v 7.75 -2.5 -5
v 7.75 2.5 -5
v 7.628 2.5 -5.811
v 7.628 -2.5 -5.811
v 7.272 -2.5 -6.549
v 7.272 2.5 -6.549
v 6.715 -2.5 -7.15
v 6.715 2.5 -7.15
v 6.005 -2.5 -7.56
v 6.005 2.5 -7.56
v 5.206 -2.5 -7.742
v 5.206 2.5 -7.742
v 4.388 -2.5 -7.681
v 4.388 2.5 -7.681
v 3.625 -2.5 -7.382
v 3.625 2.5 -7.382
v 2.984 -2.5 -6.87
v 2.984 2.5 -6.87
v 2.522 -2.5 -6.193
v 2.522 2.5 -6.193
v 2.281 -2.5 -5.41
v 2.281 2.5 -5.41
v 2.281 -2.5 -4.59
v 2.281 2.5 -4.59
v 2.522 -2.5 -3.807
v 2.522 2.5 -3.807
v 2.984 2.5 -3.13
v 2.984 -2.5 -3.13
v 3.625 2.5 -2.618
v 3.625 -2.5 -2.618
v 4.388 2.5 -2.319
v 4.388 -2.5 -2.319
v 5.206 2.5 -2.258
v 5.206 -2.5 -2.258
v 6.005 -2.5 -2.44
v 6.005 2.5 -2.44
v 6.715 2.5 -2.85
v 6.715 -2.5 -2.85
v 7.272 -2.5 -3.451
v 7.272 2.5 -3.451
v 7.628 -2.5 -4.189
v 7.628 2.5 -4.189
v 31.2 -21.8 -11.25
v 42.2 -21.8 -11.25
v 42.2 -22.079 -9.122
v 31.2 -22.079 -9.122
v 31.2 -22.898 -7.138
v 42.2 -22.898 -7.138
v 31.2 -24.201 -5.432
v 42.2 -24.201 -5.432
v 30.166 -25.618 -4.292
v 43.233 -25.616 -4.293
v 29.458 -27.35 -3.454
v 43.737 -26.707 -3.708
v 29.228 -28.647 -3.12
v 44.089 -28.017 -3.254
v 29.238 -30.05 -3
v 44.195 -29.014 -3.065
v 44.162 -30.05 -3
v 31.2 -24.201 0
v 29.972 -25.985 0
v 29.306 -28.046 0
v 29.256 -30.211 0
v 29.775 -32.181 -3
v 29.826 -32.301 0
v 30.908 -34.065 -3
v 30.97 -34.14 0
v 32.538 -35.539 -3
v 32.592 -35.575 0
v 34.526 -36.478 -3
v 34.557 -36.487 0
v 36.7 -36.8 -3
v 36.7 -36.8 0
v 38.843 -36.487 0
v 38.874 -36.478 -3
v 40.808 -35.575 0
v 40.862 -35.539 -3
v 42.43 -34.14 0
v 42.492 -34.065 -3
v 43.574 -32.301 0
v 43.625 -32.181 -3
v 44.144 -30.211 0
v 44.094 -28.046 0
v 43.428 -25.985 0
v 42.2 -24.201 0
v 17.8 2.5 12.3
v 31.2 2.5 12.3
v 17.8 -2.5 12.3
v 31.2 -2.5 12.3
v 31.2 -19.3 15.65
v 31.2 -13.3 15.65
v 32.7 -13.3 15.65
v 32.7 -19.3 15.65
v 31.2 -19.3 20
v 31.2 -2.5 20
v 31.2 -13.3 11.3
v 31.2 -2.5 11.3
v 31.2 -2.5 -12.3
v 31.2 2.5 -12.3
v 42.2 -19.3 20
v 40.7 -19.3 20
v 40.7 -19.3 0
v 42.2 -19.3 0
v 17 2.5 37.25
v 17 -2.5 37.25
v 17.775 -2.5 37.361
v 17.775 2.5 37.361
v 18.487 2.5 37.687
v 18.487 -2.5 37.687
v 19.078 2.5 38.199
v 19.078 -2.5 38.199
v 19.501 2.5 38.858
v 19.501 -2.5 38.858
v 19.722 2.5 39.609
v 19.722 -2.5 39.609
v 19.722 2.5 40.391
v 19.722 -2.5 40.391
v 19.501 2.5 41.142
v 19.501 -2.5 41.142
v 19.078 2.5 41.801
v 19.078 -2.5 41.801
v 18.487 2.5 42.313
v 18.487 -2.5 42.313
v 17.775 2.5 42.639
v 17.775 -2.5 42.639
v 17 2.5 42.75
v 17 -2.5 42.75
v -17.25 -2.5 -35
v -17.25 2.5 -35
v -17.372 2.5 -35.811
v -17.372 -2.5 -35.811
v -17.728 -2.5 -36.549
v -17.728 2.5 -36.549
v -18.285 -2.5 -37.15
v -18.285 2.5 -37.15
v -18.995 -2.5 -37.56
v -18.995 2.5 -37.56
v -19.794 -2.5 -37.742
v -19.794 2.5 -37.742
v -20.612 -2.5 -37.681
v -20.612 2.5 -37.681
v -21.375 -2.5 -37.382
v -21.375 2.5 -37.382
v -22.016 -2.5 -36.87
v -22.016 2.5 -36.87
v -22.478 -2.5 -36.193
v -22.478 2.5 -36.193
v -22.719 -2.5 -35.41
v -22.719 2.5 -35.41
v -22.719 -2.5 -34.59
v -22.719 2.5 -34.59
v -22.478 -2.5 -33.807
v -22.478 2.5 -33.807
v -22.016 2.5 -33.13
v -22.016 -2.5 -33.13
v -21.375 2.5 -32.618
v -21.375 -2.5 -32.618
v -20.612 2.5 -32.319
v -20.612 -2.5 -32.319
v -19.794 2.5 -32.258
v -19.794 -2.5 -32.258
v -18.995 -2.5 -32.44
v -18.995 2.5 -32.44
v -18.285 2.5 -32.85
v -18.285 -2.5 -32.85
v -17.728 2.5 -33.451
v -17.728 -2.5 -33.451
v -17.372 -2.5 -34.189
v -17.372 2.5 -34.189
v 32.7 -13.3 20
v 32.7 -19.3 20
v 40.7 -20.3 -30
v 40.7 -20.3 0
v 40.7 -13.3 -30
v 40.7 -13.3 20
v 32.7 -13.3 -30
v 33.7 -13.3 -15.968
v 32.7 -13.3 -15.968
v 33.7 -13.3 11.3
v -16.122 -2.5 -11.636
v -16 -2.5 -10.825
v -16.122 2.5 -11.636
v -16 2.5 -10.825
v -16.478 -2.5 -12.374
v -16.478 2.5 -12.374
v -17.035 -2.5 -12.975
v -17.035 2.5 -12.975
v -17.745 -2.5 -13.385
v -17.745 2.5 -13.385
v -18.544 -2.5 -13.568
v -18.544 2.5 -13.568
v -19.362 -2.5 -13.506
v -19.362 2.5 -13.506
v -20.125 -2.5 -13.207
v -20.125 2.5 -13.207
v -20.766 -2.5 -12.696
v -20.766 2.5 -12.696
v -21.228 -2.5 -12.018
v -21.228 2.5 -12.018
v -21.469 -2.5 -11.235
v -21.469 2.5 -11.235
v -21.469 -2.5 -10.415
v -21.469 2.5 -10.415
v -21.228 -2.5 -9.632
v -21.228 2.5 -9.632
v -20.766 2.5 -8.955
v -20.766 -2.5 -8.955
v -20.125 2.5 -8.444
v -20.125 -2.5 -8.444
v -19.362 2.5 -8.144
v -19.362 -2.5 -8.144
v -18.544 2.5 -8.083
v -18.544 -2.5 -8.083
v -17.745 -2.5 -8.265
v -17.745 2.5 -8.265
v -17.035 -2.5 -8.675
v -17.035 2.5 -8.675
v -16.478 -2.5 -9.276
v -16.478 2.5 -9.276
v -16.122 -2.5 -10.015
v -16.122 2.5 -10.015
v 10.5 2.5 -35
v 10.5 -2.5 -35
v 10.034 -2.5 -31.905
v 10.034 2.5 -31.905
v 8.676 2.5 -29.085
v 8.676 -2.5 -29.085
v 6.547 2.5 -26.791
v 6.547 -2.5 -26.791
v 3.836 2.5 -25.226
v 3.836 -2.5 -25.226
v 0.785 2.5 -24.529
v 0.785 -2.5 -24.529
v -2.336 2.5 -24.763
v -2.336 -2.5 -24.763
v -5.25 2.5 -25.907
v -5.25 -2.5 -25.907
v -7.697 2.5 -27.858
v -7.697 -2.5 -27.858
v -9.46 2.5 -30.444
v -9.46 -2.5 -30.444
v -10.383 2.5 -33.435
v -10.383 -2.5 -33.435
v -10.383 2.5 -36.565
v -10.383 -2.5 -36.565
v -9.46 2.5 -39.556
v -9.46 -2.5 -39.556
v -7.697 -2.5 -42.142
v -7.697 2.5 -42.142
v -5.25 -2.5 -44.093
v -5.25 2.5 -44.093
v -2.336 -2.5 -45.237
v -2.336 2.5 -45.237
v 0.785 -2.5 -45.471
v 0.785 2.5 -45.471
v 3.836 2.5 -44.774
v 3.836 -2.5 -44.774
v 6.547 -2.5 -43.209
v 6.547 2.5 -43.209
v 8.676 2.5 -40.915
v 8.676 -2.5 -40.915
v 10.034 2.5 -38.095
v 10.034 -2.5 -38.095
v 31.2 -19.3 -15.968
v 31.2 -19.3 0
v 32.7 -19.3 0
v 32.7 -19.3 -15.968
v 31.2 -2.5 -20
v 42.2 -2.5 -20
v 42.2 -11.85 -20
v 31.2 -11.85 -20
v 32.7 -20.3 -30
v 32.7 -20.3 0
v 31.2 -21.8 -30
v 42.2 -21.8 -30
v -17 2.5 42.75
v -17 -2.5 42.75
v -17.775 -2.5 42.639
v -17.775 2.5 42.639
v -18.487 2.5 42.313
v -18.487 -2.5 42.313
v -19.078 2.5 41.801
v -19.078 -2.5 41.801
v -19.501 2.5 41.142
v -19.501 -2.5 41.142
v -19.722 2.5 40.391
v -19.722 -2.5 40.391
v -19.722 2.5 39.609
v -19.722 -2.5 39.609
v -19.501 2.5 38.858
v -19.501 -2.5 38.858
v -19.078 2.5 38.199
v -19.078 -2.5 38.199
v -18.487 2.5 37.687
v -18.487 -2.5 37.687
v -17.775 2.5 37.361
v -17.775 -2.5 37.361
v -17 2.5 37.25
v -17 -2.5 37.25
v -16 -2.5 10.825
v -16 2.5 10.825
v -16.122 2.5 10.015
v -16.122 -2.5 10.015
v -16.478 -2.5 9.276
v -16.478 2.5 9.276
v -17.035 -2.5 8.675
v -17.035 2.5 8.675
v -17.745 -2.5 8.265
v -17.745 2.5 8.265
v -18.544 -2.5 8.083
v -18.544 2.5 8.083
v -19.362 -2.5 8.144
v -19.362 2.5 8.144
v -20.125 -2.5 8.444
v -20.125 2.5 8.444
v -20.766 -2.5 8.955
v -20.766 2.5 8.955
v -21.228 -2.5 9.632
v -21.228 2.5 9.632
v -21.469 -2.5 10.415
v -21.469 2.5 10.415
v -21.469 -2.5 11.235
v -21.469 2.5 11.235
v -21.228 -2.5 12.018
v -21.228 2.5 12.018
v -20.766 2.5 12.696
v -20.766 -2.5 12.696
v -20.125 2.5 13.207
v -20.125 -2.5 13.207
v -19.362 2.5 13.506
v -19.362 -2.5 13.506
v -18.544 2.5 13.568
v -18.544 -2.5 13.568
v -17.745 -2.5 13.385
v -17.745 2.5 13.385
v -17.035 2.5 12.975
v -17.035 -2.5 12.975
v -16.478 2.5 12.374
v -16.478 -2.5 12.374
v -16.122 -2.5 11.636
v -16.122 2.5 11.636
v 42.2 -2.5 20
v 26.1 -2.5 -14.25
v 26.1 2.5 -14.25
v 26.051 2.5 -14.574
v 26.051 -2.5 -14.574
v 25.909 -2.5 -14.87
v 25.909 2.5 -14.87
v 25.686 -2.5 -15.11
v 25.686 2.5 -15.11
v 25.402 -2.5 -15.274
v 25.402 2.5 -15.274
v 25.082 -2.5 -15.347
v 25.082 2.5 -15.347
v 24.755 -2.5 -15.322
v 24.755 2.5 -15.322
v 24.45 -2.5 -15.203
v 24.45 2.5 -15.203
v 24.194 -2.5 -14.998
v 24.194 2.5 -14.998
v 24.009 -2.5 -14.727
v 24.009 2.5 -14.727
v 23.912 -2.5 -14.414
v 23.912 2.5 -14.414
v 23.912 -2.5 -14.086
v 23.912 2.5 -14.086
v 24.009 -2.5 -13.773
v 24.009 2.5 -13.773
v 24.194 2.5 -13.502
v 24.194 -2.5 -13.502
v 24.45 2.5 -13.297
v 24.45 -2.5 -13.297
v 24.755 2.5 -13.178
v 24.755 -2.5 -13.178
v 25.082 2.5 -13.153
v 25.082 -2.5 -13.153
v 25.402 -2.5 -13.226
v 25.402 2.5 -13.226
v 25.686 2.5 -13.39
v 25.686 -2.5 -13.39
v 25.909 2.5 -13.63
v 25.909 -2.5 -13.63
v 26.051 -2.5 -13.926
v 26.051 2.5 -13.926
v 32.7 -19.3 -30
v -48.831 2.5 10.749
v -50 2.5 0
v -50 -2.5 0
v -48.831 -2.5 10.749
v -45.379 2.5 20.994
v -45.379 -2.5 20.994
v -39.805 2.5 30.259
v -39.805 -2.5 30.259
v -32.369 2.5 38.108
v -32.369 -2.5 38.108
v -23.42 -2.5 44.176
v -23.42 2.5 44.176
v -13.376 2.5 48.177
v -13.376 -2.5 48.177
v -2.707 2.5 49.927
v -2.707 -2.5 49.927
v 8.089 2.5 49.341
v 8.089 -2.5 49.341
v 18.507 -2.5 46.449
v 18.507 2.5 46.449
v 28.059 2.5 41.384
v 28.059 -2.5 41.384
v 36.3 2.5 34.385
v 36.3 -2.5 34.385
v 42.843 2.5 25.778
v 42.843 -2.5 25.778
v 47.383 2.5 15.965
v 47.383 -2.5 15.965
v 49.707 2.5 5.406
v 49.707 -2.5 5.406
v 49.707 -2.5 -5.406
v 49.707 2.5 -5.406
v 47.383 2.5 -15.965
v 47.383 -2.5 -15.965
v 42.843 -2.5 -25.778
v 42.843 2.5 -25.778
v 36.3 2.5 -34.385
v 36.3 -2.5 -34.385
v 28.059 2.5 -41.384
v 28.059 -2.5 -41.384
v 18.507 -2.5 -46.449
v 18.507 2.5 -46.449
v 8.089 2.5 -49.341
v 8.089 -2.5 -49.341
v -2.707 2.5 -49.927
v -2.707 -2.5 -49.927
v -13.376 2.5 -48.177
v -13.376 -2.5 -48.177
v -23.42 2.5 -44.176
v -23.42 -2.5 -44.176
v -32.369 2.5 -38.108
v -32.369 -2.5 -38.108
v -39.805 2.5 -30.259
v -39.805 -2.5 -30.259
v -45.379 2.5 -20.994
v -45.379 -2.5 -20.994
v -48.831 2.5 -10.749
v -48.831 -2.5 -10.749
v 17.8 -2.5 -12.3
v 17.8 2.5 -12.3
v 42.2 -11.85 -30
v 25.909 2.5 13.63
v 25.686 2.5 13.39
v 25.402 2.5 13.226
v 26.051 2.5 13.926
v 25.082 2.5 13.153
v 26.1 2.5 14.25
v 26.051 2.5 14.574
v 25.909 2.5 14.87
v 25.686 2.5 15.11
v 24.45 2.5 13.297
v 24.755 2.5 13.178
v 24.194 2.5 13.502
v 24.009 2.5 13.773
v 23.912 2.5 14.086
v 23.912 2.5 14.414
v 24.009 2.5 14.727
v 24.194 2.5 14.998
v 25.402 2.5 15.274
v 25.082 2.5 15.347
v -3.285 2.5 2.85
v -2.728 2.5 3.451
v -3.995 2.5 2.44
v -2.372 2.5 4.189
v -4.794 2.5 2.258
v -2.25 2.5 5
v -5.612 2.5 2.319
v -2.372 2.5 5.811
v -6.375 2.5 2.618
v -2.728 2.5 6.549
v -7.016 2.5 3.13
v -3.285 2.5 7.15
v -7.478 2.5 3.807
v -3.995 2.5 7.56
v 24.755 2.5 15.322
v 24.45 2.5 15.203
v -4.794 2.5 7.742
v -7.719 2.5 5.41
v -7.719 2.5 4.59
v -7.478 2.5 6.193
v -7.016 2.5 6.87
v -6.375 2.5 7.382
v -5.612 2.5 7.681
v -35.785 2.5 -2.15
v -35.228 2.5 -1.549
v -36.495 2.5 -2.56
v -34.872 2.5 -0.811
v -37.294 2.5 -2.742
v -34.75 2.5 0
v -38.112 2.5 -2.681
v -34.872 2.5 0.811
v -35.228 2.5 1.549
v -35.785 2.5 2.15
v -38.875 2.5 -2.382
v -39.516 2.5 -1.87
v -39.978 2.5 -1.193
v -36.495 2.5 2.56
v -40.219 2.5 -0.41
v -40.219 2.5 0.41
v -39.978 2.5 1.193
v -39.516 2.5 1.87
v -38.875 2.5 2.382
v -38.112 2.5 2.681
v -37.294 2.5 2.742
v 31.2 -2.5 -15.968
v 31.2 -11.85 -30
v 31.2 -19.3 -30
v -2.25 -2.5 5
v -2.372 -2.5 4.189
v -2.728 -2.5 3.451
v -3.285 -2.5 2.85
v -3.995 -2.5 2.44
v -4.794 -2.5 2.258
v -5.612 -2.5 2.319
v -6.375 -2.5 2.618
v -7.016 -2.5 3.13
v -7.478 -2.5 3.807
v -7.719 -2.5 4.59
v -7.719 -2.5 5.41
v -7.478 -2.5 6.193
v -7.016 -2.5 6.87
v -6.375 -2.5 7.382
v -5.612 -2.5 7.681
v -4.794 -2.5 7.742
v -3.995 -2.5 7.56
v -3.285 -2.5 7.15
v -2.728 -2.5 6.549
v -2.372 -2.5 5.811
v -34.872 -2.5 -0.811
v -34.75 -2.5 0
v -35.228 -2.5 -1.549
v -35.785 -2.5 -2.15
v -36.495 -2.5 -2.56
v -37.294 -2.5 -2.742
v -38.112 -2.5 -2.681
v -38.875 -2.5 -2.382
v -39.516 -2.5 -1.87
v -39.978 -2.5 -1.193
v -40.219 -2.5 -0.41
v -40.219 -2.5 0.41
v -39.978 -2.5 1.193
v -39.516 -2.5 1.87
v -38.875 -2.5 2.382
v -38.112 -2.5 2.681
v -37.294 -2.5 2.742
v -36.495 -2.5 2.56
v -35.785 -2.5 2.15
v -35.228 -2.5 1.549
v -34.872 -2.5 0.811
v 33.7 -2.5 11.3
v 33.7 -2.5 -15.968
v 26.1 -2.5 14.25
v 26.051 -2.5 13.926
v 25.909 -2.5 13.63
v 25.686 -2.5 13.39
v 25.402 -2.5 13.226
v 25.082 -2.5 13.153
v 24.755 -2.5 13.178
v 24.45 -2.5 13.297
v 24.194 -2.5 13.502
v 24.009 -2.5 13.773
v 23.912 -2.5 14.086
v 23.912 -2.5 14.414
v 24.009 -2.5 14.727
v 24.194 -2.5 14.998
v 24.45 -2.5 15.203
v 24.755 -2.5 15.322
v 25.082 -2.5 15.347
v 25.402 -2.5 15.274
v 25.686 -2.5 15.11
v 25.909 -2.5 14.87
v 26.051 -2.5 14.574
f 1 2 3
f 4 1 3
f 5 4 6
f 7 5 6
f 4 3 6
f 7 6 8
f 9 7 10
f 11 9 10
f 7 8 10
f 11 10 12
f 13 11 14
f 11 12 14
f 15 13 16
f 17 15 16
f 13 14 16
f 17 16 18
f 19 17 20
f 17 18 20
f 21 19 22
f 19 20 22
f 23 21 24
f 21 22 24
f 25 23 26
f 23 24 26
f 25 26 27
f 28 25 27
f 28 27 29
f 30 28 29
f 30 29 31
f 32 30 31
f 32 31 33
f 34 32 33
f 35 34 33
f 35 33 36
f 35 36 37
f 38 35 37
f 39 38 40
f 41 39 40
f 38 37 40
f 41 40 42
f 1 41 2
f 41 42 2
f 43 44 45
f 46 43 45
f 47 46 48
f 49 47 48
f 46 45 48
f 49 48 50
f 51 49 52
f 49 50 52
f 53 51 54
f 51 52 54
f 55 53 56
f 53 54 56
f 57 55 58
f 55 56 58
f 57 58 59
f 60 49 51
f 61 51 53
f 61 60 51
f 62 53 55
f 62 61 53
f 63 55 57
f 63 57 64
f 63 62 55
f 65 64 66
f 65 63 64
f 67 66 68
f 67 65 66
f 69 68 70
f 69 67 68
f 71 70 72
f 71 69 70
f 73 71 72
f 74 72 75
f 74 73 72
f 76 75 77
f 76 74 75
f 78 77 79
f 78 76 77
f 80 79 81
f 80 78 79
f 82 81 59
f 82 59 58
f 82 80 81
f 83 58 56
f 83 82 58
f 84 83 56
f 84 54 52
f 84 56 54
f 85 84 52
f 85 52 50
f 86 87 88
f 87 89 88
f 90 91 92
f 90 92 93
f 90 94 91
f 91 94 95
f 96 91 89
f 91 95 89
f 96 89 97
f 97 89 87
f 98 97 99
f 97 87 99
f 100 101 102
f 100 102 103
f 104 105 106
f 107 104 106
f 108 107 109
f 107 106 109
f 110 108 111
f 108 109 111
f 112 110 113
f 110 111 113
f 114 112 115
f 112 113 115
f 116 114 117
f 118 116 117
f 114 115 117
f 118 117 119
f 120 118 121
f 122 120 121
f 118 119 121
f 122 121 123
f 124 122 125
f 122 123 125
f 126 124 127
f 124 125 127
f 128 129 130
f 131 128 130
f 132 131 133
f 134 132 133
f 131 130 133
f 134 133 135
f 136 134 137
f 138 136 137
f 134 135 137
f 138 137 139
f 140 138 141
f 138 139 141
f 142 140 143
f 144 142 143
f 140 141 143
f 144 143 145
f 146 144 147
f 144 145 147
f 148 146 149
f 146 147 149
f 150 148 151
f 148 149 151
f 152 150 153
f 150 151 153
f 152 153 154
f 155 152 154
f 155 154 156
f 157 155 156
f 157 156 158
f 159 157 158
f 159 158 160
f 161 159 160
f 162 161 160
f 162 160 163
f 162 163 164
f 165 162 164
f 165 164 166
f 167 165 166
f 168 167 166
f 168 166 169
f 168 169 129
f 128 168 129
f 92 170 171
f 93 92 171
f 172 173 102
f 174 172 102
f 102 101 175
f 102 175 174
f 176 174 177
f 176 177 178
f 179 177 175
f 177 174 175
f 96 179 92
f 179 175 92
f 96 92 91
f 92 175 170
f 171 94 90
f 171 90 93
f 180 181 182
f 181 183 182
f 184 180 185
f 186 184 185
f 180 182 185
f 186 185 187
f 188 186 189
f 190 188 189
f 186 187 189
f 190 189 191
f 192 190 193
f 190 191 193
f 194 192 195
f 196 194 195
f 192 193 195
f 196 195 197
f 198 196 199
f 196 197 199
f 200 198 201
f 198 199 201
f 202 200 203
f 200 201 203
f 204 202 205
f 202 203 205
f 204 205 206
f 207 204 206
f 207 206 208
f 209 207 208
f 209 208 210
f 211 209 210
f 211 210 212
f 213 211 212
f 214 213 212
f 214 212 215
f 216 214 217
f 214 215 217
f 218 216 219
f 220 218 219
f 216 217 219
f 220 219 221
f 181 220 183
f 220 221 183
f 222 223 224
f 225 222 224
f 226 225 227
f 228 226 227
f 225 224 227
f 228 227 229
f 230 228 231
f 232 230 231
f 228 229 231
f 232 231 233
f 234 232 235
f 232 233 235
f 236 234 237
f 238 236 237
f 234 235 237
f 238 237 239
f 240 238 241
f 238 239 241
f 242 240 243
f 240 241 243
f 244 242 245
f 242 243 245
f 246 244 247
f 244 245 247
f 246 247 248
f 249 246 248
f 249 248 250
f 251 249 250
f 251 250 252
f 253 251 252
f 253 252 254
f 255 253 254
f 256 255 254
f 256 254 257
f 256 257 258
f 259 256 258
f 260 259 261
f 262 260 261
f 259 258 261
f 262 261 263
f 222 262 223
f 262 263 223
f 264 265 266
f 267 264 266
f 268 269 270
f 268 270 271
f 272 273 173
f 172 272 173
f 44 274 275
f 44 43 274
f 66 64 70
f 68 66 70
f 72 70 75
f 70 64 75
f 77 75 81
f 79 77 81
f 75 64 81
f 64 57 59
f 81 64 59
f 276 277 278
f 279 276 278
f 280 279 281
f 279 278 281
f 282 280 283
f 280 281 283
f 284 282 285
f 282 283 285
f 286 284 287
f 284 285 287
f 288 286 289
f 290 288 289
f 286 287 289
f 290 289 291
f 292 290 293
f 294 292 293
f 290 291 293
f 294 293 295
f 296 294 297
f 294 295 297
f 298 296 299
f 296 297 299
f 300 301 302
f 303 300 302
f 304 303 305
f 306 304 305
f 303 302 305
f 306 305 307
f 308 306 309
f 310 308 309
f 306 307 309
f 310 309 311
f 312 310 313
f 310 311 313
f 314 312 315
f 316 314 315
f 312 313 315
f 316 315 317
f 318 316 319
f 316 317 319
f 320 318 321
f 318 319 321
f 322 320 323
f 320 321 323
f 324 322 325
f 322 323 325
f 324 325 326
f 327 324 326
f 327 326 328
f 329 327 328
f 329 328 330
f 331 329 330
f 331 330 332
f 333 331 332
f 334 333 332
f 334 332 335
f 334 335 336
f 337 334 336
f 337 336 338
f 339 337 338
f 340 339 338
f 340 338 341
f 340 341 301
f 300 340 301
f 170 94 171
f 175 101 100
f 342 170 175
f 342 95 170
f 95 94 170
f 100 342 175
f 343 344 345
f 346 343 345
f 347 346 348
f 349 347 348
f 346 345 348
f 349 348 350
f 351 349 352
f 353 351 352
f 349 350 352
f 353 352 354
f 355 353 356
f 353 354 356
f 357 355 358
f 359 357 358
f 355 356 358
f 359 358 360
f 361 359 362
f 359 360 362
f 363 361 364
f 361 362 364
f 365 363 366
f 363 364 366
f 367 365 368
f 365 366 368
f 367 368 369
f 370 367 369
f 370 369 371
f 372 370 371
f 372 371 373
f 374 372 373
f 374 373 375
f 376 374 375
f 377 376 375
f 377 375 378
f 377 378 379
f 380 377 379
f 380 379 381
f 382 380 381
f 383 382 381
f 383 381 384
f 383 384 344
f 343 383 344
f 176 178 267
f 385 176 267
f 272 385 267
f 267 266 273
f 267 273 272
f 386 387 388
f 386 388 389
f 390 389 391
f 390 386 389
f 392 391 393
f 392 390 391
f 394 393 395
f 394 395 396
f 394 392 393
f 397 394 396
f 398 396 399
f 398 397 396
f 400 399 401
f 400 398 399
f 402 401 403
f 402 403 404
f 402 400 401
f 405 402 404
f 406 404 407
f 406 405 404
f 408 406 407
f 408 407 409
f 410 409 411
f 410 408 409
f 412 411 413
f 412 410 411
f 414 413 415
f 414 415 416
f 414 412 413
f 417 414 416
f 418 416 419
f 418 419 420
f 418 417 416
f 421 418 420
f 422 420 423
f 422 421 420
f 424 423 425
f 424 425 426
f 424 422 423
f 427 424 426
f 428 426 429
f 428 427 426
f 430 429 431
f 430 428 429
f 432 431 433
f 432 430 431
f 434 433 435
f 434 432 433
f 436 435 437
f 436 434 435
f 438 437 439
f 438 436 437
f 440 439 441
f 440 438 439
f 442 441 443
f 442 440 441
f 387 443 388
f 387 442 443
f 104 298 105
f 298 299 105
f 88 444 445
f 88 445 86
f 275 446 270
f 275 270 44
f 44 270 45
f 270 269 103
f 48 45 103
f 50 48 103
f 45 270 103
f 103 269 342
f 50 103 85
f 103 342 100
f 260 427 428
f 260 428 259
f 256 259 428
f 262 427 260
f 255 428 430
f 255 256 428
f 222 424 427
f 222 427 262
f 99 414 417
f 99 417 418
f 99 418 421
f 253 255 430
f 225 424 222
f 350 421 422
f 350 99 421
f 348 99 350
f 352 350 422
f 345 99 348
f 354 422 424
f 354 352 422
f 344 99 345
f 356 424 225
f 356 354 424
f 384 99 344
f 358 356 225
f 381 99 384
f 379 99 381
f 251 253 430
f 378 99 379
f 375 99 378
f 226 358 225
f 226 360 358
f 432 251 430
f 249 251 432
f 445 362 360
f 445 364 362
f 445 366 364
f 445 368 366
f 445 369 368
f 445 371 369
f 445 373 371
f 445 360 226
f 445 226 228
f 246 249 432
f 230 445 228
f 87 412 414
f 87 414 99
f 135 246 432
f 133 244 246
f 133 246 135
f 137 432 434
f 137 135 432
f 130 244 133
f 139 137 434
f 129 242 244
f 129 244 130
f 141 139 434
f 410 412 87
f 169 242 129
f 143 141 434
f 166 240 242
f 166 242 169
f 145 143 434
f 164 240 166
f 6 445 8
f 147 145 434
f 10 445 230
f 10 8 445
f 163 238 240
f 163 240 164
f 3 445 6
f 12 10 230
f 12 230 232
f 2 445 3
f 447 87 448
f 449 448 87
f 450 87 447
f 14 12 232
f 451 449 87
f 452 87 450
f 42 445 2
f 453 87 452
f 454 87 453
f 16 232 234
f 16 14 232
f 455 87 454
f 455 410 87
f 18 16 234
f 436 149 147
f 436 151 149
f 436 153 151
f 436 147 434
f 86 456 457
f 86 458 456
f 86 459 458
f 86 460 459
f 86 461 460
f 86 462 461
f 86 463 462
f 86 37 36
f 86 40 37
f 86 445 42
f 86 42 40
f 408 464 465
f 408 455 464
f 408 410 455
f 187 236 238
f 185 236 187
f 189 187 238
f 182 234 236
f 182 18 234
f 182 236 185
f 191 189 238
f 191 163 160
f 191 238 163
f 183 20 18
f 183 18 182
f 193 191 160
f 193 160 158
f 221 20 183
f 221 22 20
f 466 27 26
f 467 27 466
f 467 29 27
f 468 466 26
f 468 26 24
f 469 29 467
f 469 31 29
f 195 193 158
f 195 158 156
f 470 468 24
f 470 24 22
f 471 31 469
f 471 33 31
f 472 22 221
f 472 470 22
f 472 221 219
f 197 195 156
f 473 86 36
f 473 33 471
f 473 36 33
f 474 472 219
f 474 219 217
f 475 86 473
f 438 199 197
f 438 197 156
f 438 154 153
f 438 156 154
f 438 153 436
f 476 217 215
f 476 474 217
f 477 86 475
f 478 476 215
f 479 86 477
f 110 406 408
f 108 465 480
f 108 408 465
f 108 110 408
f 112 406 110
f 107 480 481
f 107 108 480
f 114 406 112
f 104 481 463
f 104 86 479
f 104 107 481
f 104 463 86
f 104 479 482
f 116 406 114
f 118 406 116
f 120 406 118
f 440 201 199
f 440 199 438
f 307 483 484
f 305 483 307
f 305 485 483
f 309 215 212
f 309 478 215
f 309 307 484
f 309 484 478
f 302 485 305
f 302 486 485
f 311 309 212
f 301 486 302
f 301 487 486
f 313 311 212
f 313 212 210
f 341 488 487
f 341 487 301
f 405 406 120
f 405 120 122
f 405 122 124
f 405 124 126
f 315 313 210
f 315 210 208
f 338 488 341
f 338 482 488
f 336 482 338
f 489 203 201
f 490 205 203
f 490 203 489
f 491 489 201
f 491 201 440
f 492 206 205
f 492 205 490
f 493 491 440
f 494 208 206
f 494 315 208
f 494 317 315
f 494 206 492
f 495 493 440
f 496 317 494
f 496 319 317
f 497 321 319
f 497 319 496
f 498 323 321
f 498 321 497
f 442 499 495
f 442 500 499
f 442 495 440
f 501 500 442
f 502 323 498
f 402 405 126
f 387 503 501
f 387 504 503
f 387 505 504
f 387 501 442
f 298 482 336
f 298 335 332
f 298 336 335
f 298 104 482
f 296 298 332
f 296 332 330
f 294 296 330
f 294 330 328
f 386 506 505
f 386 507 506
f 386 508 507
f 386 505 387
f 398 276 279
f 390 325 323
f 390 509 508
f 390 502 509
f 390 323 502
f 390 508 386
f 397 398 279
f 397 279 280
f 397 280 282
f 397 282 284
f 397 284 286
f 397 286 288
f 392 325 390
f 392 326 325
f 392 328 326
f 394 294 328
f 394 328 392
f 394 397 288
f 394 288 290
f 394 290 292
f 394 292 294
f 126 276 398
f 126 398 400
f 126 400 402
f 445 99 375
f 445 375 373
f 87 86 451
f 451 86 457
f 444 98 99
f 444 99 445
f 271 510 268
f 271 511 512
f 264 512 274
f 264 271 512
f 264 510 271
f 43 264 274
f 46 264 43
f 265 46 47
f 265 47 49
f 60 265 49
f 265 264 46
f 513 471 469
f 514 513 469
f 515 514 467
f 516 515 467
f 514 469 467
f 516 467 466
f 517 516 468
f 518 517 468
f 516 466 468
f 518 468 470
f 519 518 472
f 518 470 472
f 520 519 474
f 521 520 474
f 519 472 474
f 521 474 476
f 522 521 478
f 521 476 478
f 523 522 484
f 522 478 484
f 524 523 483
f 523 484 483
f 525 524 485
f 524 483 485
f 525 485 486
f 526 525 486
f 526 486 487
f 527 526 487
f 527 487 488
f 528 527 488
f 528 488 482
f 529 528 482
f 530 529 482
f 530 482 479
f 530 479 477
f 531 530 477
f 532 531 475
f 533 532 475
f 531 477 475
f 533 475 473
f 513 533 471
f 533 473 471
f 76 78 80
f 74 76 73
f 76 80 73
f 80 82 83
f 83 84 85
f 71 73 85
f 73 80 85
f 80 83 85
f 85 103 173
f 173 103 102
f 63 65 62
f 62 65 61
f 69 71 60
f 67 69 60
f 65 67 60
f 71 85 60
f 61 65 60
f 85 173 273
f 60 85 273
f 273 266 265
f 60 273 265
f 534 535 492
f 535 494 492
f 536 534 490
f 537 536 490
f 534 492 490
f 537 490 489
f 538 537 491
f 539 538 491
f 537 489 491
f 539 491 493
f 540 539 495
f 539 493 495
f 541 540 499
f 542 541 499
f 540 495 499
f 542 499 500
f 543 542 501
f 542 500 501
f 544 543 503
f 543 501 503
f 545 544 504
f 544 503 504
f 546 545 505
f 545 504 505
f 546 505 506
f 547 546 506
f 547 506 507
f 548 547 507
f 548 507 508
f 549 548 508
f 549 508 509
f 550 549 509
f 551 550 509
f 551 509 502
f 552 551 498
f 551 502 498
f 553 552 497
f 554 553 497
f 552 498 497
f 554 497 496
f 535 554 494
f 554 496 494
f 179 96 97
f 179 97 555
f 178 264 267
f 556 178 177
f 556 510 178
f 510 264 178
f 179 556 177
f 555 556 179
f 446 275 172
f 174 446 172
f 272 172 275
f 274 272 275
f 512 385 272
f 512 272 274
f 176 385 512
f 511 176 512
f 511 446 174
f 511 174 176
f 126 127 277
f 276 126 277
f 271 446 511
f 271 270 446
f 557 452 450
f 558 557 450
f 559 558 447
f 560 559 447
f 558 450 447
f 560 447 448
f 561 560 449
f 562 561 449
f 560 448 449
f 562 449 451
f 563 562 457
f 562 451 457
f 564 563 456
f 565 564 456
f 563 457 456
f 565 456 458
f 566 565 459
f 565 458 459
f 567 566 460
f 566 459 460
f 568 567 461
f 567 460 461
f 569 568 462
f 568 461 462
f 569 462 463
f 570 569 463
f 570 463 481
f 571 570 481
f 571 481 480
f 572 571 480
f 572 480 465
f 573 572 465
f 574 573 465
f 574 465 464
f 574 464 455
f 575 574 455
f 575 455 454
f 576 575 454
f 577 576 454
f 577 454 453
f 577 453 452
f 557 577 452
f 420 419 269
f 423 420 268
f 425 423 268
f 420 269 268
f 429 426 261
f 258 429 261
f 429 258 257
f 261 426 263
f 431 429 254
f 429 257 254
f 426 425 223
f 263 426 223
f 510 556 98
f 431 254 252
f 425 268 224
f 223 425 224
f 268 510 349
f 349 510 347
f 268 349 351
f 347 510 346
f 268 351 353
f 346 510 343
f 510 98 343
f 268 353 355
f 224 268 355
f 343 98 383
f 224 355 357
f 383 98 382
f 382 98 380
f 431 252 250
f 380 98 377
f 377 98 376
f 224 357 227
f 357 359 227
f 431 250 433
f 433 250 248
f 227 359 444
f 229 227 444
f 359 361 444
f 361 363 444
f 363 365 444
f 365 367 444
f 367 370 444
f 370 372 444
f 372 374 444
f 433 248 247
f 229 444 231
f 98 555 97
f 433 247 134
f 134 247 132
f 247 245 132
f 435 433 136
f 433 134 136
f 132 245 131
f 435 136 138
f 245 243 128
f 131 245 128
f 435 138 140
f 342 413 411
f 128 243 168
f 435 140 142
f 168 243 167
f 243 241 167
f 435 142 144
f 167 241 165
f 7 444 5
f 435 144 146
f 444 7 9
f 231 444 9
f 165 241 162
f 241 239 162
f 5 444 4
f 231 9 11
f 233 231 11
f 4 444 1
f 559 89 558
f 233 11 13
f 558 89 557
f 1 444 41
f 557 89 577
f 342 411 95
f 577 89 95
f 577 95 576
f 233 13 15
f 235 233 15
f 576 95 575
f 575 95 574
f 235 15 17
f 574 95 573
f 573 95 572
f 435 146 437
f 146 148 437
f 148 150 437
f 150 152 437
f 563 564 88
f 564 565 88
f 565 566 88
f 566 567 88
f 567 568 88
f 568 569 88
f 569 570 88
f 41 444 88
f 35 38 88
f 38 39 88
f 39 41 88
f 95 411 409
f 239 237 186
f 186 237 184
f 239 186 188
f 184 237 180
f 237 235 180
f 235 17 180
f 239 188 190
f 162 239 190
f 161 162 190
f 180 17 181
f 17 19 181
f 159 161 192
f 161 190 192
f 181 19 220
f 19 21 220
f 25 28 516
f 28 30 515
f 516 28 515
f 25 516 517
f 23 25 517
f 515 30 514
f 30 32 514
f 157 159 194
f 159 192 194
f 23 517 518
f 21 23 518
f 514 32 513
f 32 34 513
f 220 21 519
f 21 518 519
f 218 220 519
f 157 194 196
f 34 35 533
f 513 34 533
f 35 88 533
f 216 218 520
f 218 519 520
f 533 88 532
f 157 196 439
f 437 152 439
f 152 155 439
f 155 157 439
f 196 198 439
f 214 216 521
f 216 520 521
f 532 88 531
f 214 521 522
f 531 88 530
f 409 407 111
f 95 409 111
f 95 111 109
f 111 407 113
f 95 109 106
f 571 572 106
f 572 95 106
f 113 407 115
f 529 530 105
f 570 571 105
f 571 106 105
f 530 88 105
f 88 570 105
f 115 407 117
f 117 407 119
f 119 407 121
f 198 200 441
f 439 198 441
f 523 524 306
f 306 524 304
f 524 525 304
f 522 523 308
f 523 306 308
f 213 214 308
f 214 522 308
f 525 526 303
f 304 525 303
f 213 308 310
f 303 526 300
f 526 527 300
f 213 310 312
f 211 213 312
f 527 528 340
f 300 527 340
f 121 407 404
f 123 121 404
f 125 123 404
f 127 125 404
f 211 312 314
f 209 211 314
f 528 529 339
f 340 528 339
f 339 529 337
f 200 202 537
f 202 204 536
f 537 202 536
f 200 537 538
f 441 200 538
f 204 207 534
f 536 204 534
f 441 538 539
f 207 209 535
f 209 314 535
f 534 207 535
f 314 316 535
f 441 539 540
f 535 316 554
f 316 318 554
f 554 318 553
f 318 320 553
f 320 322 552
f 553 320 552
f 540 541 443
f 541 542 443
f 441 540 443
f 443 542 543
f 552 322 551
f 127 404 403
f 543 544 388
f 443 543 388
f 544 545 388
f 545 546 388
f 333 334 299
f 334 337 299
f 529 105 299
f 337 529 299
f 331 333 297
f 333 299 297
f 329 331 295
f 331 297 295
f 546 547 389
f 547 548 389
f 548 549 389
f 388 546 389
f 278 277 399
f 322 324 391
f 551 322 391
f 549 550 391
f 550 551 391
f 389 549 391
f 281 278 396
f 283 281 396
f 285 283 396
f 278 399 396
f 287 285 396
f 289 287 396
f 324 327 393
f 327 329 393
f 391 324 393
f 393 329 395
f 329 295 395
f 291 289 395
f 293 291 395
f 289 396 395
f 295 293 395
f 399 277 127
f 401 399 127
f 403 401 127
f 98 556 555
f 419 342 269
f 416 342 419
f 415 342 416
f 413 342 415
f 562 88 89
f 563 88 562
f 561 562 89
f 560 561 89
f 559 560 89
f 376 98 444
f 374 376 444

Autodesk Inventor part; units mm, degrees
ref_plane "YZ Plane" through (0, 0, 0) normal (1, 0, 0) x (0, 1, 0)
ref_plane "XZ Plane" through (0, 0, 0) normal (0, 1, 0) x (-1, 0, 0)
ref_plane "XY Plane" through (0, 0, 0) normal (0, 0, 1) x (1, 0, 0)
sketch "Sketch1" plane through (0, 0, 0) normal (0, 1, 0) x (-1, 0, 0)
  circle A0 centre (0, 0) radius 50
  dimension "d0" = 100
extrude "Extrusion1" add sketch "Sketch1" along normal mid plane 5
sketch "Sketch2" plane through (0, 2.5, 0) normal (0, 1, 0) x (1, 0, 0)
  line L0 (-5, 5) -> (5, 5) construction
  line L1 (5, 5) -> (5, -5) construction
  line L2 (5, -5) -> (-5, -5) construction
  line L3 (-5, -5) -> (-5, 5) construction
  line L4 (-5, 5) -> (5, -5) construction
  line L5 (5, 5) -> (-5, -5) construction
  circle A0 centre (5, 5) radius 2.75
  circle A1 centre (-5, -5) radius 2.75
  point P0 (0, 0)
  dimension "d77" = 10
  dimension "d78" = 10
  dimension "d80" = 5.5
  dimension "d81" = 5.5
extrude "Extrusion2" cut sketch "Sketch2" against normal blind 10
sketch "Sketch3" plane through (0, 2.5, 0) normal (0, 1, 0) x (1, 0, 0)
  line L0 (0, 0) -> (25, 0) construction
  line L1 (18.8, -11.3) -> (31.2, -11.3)
  line L2 (31.2, -11.3) -> (31.2, 11.3)
  line L3 (31.2, 11.3) -> (18.8, 11.3)
  line L4 (18.8, 11.3) -> (18.8, -11.3)
  line L5 (18.8, -11.3) -> (31.2, 11.3) construction
  line L6 (31.2, -11.3) -> (18.8, 11.3) construction
  line L7 (25, 0) -> (25, 14.25) construction
  line L8 (25, 0) -> (25, -14.25) construction
  circle A0 centre (25, 14.25) radius 1.1
  circle A1 centre (25, -14.25) radius 1.1
  dimension "d9" = 25
  dimension "d10" = 12.4
  dimension "d11" = 22.6
  dimension "d21" = 14.25
  dimension "d22" = 14.25
  dimension "d23" = 2.2
  dimension "d24" = 2.2
extrude "Extrusion3" cut sketch "Sketch3" against normal blind 10
sketch "Sketch5" plane through (0, -2.5, 0) normal (0, -1, 0) x (1, 0, 0)
  line L0 (31.2, -11.3) -> (33.7, -11.3)
  line L1 (33.7, -11.3) -> (33.7, 11.3)
  line L2 (33.7, 11.3) -> (31.2, 11.3)
  line L3 (31.2, 11.3) -> (31.2, -11.3)
  line L4 (31.2, -11.3) -> (31.2, 11.3) construction
  line L5 (31.2, 0) -> (39.7, 0) construction
  line L6 (39.7, 0) -> (39.7, -20) construction
  line L7 (39.7, -20) -> (31.2, -20)
  line L8 (31.2, -20) -> (31.2, 20)
  line L9 (31.2, 20) -> (39.7, 20)
  line L10 (39.7, 20) -> (39.7, -20)
  line L11 (33.7, -11.3) -> (33.7, -20)
  line L12 (33.7, 11.3) -> (33.7, 20)
  point P0 (0, 0)
  point P1 (31.2, 11.3)
  dimension "d34" = 2.5
  dimension "d35" = 8.5
  dimension "d36" = 20
  dimension "d37" = 40
extrude "Extrusion5" add sketch "Sketch5" along normal blind 11.8 contours L1 L12 L9 L10 L7 L11
sketch "Sketch6" plane through (0, -2.5, 0) normal (0, -1, 0) x (1, 0, 0)
  line L0 (31.2, -11.3) -> (31.2, 11.3) projected
  line L1 (31.2, 0) -> (33.7, 0)
  line L2 (33.7, 0) -> (33.7, -20)
  line L3 (33.7, -20) -> (31.2, -20)
  line L4 (31.2, -20) -> (31.2, 0)
  line L5 (39.7, 20) -> (33.7, 20) projected
  line L6 (31.2, 0) -> (33.7, 0)
  line L7 (33.7, 0) -> (33.7, 20)
  line L8 (33.7, 20) -> (31.2, 20)
  line L9 (31.2, 20) -> (31.2, 0)
  line L10 (18.8, 11.3) -> (31.2, 11.3) projected
  line L11 (31.2, 11.3) -> (33.7, 11.3)
  line L12 (33.7, -20) -> (33.7, 20) projected
  line L13 (39.7, 20) -> (42.2, 20)
  line L14 (42.2, 20) -> (42.2, -20)
  line L15 (42.2, -20) -> (39.7, -20)
  line L16 (39.7, -20) -> (39.7, 20)
  line L17 (31.2, -15.9678) -> (33.7, -15.9678)
  point P0 (0, 0)
  point P1 (31.2, 11.3)
  dimension "d40" = 2.5
extrude "Extrusion6" add sketch "Sketch6" along normal blind 16.8 contours L13 L14 L15 L16 | L17 L2 L3 L4 | L9 L8 L7 L11
sketch "Sketch7" plane through (0, -19.3, 0) normal (0, -1, 0) x (1, 0, 0)
  line L0 (42.2, -20) -> (31.2, -20) projected
  line L1 (31.2, -20) -> (42.2, -20)
  line L2 (42.2, -20) -> (42.2, 0)
  line L3 (42.2, 0) -> (31.2, 0)
  line L4 (31.2, 0) -> (31.2, -20)
  point P0 (0, 0)
extrude "Extrusion7" add sketch "Sketch7" along normal blind 2.5
sketch "Sketch8" plane through (31.2, -19.3, 0) normal (0, 0, 1) x (1, 0, 0)
  line L0 (0, -2.5) -> (11, -2.5) construction
  line L1 (5.5, -2.5) -> (5.5, -10) construction
  circle A0 centre (5.5, -10) radius 7.5
  line L2 (0, 16.8) -> (0, -2.5) construction
  line L3 (11, 16.8) -> (11, -2.5) projected
  line L4 (11, -2.5) -> (11, -4.901)
  line L5 (0, -2.5) -> (0, -4.901)
  line L6 (11, -2.5) -> (0, -2.5)
  point P0 (-31.2, 19.3)
  dimension "d45" = 7.5
extrude "Extrusion8" add sketch "Sketch8" against normal blind 3
fillet "Fillet1" radius 8.25 1 edges at (36.7, -21.8, -3)
sketch "Sketch9" plane through (42.2, -2.5, -20) normal (0, 0, -1) x (-1, 0, 0)
  line L0 (11, -16.8) -> (8.5, -16.8) projected
  line L1 (8.5, -16.8) -> (2.5, -16.8)
  line L2 (2.5, -16.8) -> (2.5, -11.8)
  line L3 (2.5, -11.8) -> (8.5, -11.8)
  line L4 (8.5, -11.8) -> (8.5, -16.8)
  line L5 (11, 0) -> (11, -19.3) projected
  line L6 (0, 0) -> (0, -19.3) projected
  line L7 (11, -19.3) -> (0, -19.3)
  line L8 (0, -19.3) -> (0, -9.35)
  line L9 (0, -9.35) -> (11, -9.35)
  line L10 (11, -9.35) -> (11, -19.3)
  point P0 (42.2, 2.5)
  dimension "d49" = 9.95
extrude "Extrusion9" add sketch "Sketch9" along normal blind 10
sketch "Sketch12" plane through (0, 2.5, 0) normal (0, 1, 0) x (1, 0, 0)
  circle A0 centre (-25, 0) radius 12.5 construction
  line L0 (-25, 0) -> (-18.75, -10.8253) construction
  line L1 (-25, 0) -> (-37.5, 0) construction
  line L2 (-25, 0) -> (-18.75, 10.8253) construction
  circle A1 centre (-37.5, 0) radius 2.75
  circle A2 centre (-18.75, 10.8253) radius 2.75
  circle A3 centre (-18.75, -10.8253) radius 2.75
  point P0 (0, 0)
  dimension "d64" = 25
  dimension "d65" = 120
  dimension "d67" = 5.5
  dimension "d68" = 5.5
  dimension "d69" = 5.5
  dimension "d70" = 25
extrude "Extrusion12" cut sketch "Sketch12" against normal blind 10
sketch "Sketch13" plane through (0, -2.5, 0) normal (0, -1, 0) x (1, 0, 0)
  line L0 (0, 0) -> (0, -35) construction
  circle A0 centre (0, -35) radius 10.5
  dimension "d73" = 35
  dimension "d74" = 21
extrude "Extrusion13" cut sketch "Sketch13" against normal blind 10
sketch "Sketch14" plane through (31.2, -2.5, 20) normal (0, 0, 1) x (1, 0, 0)
  line L0 (8.5, -16.8) -> (2.5, -16.8)
  line L1 (2.5, -16.8) -> (2.5, -11.8)
  line L2 (2.5, -11.8) -> (8.5, -11.8)
  line L3 (8.5, -11.8) -> (8.5, -16.8)
  line L4 (1.5, -17.8) -> (9.5, -17.8)
  line L5 (9.5, -17.8) -> (9.5, -10.8)
  line L6 (9.5, -10.8) -> (1.5, -10.8)
  line L7 (1.5, -10.8) -> (1.5, -17.8)
  point P0 (-31.2, 2.5)
  dimension "d83" = 1
extrude "Extrusion14" cut sketch "Sketch14" against normal through all
sketch "Sketch17" plane through (0, -2.5, 0) normal (0, -1, 0) x (1, 0, 0)
  line L0 (0, 0) -> (0, 40) construction
  line L1 (-17, 40) -> (17, 40) construction
  line L2 (-17, 37.25) -> (17, 37.25)
  line L3 (17, 42.75) -> (-17, 42.75)
  arc A0 (-17, 42.75) -> (-17, 37.25) centre (-17, 40) ccw
  arc A1 (17, 37.25) -> (17, 42.75) centre (17, 40) ccw
  dimension "d104" = 17
  dimension "d105" = 5.5
extrude "Extrusion15" cut sketch "Sketch17" against normal through all
sketch "Sketch18" plane through (0, -2.5, 0) normal (0, -1, 0) x (1, 0, 0)
  line L0 (31.2, 20) -> (31.2, 11.3) projected
  line L1 (31.2, 11.3) -> (31.2, 12.3)
  line L2 (31.2, 12.3) -> (17.8, 12.3)
  line L3 (17.8, 12.3) -> (31.2, 12.3)
  line L4 (31.2, 12.3) -> (31.2, -12.3)
  line L5 (31.2, -12.3) -> (17.8, -12.3)
  line L6 (17.8, -12.3) -> (17.8, 12.3)
  point P0 (0, 0)
  dimension "d93" = 1
  dimension "d94" = 13.4
  dimension "d95" = 24.6
extrude "Extrusion16" cut sketch "Sketch18" against normal blind 10
sketch "Sketch19" plane through (31.2, -19.3, 11.3) normal (-1, 0, 0) x (0, 0, 1)
  line L0 (-27.2678, 6) -> (0, 6) projected
  line L1 (8.7, 0) -> (0, 0) projected
  line L2 (0, 6) -> (4.35, 6)
  line L3 (4.35, 6) -> (4.35, 0)
  line L4 (4.35, 0) -> (0, 0)
  line L5 (0, 0) -> (0, 6)
  point P0 (-11.3, 19.3)
extrude "Extrusion17" cut sketch "Sketch19" against normal up to surface (1.5 mm away)
sketch "Sketch22" plane through (0, 2.5, 0) normal (0, 1, 0) x (1, 0, 0)
  circle A0 centre (0, 35) radius 10.5 projected
  line L0 (0, 35) -> (-20, 35) construction
  circle A1 centre (-20, 35) radius 2.75
  point P0 (0, 0)
  dimension "d100" = 20
  dimension "d101" = 5.5
extrude "Extrusion18" cut sketch "Sketch22" against normal blind 10 contours A1
equation "\"d80\" = d82"
equation "\"d81\" = d82"
equation "\"d82\" = 5.5"
properties part number "EndEffectorPlate" material "ABS Plastic"
